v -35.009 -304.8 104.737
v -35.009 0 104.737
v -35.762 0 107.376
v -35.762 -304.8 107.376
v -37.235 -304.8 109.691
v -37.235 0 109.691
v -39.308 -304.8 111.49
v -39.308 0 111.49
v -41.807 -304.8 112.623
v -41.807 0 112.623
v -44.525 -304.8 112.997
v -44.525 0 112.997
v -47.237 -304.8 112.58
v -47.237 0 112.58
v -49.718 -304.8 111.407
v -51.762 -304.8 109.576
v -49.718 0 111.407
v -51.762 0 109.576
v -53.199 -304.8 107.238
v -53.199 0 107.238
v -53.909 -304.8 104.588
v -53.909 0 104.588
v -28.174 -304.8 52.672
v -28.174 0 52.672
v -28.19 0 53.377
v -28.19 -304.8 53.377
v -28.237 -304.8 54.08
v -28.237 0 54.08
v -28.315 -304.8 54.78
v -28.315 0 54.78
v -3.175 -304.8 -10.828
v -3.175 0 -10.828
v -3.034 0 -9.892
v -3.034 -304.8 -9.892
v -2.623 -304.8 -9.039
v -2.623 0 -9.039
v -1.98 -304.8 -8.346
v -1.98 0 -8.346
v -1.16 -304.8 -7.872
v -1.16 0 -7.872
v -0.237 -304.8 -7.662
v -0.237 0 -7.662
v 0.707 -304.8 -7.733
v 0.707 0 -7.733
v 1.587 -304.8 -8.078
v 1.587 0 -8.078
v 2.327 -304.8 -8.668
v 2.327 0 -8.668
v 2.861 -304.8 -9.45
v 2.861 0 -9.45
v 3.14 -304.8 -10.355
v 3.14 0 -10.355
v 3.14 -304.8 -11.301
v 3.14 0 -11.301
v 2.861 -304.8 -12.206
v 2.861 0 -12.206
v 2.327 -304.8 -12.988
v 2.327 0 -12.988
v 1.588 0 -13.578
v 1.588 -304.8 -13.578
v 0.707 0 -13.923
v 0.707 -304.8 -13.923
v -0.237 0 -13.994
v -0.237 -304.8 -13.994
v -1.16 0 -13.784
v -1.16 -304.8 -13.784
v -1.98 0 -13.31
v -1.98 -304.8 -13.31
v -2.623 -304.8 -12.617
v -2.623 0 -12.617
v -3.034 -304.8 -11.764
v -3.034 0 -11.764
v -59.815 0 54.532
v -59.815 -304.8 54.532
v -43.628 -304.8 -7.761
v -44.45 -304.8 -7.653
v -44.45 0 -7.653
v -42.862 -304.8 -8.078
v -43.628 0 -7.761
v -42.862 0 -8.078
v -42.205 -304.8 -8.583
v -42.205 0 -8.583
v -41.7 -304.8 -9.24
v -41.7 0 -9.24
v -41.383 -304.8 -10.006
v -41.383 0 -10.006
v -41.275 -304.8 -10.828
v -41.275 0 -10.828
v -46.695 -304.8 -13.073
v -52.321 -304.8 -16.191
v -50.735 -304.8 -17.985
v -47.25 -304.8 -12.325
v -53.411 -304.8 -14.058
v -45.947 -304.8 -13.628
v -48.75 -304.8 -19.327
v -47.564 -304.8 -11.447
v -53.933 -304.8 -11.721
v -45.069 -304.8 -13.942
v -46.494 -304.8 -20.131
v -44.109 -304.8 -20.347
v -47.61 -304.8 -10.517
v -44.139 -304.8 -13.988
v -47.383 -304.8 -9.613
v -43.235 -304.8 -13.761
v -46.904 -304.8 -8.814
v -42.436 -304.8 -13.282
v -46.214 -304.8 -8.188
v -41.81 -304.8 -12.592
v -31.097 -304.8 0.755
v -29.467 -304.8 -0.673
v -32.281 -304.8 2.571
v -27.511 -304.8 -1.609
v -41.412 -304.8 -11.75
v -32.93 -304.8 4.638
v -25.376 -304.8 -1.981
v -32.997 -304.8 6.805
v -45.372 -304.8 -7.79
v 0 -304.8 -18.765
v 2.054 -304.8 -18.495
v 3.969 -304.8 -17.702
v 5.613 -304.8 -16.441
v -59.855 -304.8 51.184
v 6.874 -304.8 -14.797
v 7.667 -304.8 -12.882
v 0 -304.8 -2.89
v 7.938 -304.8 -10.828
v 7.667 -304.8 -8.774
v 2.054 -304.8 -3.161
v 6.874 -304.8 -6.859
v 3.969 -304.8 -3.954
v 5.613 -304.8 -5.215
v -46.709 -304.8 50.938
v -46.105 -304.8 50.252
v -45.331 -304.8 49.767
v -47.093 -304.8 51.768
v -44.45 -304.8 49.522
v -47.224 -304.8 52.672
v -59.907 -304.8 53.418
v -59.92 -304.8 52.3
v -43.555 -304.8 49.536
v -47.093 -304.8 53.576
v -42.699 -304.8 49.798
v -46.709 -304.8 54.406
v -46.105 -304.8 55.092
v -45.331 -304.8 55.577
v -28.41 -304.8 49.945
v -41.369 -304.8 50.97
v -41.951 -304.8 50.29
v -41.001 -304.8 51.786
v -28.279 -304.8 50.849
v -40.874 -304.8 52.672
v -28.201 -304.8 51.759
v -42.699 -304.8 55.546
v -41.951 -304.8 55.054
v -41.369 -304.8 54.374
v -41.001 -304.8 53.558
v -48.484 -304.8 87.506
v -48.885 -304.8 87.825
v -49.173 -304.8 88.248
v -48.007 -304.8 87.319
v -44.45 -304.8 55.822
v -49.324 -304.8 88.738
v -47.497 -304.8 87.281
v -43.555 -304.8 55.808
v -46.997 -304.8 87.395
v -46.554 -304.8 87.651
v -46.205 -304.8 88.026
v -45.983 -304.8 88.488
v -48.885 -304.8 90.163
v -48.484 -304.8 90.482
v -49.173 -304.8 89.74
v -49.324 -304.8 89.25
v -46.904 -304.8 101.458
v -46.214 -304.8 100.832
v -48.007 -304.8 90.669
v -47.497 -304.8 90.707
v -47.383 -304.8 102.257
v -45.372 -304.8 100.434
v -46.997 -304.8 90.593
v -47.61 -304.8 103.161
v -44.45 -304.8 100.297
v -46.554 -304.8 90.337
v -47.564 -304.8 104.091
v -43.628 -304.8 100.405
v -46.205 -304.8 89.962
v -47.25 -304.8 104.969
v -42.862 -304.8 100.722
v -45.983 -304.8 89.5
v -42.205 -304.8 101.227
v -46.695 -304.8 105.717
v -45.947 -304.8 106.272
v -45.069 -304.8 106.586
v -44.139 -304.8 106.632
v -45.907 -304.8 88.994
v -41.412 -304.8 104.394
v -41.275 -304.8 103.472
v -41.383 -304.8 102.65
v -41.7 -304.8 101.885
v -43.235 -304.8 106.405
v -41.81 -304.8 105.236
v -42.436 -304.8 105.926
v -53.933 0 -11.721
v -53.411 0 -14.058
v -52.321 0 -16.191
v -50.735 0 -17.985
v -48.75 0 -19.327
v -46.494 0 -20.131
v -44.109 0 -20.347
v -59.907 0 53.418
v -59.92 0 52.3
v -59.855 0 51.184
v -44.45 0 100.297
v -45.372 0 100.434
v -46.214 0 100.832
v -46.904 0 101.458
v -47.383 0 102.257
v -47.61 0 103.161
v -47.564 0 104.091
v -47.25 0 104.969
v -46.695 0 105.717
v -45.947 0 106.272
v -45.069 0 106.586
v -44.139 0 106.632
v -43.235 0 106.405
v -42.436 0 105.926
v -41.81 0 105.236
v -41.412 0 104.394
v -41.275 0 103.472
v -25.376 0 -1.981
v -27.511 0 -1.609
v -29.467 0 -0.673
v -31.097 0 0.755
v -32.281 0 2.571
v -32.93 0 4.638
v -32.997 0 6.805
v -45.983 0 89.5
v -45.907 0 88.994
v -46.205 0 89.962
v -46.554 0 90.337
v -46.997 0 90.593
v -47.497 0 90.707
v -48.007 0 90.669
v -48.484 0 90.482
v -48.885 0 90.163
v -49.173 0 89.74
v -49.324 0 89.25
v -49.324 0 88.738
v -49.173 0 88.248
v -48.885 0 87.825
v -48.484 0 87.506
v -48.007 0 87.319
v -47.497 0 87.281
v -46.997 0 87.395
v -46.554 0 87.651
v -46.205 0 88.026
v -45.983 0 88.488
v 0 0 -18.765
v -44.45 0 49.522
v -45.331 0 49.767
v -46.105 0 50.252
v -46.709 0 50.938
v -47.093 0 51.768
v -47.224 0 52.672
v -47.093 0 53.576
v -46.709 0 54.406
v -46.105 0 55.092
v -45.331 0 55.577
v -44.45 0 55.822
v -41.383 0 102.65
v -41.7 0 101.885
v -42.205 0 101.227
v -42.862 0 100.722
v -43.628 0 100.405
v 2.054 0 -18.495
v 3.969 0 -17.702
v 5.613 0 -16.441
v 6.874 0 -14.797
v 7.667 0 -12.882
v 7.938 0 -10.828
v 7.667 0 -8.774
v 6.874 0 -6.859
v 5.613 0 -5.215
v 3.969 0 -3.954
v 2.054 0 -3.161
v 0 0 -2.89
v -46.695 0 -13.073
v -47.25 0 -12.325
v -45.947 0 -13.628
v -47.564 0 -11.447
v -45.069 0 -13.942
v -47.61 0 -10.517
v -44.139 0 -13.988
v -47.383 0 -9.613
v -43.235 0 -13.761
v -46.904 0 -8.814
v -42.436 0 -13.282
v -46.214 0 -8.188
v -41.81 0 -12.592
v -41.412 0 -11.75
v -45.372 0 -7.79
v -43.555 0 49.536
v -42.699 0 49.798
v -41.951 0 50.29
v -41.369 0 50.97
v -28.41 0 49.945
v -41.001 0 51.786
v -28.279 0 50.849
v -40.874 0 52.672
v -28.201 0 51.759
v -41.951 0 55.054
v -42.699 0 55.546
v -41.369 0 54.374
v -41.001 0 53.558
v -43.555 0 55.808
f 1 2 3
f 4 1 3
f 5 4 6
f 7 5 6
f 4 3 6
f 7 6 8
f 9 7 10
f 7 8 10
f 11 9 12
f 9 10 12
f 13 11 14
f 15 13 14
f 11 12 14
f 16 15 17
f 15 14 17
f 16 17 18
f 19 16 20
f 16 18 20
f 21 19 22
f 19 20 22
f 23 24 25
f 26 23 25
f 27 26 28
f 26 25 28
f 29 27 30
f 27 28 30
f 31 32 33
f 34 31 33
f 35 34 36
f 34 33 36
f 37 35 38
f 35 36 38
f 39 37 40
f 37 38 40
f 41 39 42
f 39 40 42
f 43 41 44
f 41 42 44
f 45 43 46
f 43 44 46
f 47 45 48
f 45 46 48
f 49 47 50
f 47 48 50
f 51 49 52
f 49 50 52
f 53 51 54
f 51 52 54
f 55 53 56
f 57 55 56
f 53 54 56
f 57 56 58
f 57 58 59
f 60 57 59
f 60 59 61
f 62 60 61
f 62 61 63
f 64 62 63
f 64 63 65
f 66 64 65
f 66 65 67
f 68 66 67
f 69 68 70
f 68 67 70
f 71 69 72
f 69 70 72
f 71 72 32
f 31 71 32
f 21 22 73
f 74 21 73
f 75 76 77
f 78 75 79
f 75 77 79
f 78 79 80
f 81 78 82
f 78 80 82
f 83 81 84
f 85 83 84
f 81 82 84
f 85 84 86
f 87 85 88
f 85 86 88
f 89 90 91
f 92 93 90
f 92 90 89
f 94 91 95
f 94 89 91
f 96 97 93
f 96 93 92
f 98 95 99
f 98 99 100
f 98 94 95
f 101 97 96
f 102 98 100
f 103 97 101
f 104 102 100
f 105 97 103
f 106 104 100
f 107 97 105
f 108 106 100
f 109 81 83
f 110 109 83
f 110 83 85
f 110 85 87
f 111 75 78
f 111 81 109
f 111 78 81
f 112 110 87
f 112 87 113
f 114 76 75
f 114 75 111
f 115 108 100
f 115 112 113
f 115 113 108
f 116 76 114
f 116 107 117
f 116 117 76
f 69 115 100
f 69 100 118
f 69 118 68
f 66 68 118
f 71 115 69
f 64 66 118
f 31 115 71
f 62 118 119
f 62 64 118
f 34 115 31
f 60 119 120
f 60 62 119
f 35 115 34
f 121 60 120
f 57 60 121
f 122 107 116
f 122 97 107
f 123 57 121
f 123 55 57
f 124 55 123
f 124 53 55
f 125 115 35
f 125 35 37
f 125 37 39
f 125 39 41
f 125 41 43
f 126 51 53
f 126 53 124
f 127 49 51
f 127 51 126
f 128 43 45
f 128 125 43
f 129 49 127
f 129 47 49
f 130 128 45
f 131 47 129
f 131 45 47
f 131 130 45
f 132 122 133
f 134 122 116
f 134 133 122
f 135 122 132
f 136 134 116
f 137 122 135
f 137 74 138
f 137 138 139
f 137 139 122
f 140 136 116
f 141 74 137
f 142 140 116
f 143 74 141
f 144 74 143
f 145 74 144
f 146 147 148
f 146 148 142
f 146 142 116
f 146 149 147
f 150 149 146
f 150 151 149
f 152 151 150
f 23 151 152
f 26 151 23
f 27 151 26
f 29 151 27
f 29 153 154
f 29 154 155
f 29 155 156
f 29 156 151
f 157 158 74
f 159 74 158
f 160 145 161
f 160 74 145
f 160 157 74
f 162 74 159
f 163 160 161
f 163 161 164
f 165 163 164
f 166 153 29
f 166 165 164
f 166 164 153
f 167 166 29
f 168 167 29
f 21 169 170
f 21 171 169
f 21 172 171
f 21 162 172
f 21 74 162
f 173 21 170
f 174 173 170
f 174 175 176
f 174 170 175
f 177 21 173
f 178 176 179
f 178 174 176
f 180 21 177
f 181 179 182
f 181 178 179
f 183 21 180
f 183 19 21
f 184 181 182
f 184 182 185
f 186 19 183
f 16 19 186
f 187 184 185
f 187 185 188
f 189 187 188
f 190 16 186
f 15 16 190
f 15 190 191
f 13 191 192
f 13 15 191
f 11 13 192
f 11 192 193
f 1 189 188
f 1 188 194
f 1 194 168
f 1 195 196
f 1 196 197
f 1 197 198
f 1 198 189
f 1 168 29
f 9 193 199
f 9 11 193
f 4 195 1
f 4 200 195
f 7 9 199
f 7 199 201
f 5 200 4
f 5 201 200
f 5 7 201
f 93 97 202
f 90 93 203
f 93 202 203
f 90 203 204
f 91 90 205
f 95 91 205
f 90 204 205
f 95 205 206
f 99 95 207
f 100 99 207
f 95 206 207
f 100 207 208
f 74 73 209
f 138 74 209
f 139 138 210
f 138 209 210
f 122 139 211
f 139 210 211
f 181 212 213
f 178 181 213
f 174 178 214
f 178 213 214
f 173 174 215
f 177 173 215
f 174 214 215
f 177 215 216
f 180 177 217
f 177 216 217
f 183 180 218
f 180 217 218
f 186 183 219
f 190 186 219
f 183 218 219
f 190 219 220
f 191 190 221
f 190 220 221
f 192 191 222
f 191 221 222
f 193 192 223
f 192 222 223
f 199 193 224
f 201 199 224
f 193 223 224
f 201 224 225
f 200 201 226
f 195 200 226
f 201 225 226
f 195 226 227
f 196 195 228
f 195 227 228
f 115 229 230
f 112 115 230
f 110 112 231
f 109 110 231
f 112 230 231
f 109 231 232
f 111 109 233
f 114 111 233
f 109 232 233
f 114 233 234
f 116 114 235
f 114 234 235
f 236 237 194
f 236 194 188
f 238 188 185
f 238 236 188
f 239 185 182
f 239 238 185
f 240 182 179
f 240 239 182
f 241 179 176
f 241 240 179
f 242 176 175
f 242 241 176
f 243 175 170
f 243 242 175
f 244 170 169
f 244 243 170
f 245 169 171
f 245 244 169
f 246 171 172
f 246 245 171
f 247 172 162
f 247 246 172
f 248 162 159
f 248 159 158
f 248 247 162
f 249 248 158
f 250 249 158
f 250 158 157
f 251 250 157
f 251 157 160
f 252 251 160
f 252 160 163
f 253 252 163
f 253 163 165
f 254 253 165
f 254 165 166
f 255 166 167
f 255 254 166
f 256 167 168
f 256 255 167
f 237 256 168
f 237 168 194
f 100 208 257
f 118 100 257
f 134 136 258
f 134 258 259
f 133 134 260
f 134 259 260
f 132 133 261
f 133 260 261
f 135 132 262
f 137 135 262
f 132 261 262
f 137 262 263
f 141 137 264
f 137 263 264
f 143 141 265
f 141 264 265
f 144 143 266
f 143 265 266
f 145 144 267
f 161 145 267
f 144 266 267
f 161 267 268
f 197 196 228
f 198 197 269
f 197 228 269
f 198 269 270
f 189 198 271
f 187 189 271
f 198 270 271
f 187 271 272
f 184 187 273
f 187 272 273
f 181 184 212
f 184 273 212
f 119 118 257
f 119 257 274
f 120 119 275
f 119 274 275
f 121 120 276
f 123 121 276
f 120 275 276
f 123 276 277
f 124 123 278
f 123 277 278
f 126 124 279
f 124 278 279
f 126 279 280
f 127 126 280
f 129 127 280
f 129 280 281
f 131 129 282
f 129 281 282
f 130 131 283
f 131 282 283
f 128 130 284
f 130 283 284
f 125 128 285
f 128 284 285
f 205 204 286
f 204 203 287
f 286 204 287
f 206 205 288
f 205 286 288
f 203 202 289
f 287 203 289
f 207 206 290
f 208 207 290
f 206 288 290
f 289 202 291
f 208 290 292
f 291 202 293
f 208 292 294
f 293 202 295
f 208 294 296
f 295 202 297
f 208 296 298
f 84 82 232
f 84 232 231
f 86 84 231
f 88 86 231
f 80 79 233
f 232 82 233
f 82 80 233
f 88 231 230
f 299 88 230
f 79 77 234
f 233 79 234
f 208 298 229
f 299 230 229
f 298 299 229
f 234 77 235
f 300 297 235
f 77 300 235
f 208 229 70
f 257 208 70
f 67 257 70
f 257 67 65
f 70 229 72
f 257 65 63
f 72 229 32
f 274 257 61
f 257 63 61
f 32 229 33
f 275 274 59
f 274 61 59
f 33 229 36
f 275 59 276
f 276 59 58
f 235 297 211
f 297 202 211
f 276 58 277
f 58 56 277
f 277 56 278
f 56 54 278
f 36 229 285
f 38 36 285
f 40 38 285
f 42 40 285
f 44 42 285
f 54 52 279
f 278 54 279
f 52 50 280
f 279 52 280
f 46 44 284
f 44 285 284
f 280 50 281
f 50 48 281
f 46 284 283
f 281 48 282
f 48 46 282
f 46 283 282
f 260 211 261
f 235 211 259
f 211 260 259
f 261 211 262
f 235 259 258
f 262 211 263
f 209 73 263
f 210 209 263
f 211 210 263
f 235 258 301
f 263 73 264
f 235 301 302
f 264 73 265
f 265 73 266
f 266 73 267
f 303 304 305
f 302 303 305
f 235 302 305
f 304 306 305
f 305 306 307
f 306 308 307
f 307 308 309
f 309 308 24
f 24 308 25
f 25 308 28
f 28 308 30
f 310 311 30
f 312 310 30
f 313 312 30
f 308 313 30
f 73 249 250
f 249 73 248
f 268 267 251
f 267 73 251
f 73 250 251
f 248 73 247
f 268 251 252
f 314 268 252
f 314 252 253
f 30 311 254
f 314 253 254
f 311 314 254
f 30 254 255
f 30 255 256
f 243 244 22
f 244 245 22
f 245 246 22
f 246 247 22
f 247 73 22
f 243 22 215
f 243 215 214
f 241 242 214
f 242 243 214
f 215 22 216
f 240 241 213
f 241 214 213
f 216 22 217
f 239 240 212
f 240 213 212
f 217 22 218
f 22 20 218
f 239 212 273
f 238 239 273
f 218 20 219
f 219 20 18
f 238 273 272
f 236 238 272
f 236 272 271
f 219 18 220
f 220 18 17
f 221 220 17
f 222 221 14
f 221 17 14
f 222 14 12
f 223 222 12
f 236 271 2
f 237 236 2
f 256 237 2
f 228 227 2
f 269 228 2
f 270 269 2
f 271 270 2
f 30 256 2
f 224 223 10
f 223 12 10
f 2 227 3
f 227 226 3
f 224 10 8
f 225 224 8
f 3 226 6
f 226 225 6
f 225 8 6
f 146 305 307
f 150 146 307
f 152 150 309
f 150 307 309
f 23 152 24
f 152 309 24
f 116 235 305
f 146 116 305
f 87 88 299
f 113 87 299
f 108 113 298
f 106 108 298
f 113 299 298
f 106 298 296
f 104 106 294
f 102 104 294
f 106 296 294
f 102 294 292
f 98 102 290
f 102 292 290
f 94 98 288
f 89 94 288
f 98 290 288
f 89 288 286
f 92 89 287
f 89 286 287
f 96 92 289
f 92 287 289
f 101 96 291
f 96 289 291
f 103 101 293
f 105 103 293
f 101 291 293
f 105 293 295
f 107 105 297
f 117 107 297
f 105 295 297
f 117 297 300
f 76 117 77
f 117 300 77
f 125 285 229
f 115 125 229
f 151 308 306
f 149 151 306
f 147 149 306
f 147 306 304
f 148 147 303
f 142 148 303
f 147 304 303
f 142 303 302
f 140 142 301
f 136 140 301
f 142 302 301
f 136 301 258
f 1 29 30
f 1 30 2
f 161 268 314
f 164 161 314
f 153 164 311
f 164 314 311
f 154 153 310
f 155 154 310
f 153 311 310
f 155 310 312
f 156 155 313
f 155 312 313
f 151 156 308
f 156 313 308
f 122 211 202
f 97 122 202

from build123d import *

# Parameters (mm, degrees)
F0_R     = 1.7182468223
F1_DEPTH = 304.8


with BuildPart() as f1:
    # F0 (on Front) → F1 (new body)
    with BuildSketch(Plane.XZ):
        with BuildLine():
            Line((-32.9967385804, 6.8048425582), (-28.4104094703, 49.945047138))
            ThreePointArc((-28.4104094703, 49.945047138), (-33.9877661328, 40.392821433), (-44.45, 36.8020574797))
            Line((-44.45, 36.8020574797), (-44.45, -1.302996767))
            ThreePointArc((-44.45, -1.302996767), (-37.7148079092, -4.0928046762), (-34.925, -10.827996767))
            Line((-34.925, -10.827996767), (-7.9375, -10.827996767))
            ThreePointArc((-7.9375, -10.827996767), (-5.6126600757, -5.2153366913), (0, -2.890496767))
            Line((0, -2.890496767), (-25.3759362201, -1.9807197434))
            ThreePointArc((-25.3759362201, -1.9807197434), (-31.0967184952, 0.7549521344), (-32.9967385804, 6.8048425582))
        make_face()
        with BuildLine():
            ThreePointArc((-44.45, 36.8020574797), (-54.883074079, 41.0682090736), (-59.8545699484, 51.1842020046))
            Line((-59.8545699484, 51.1842020046), (-53.9330768267, -11.720677504))
            ThreePointArc((-53.9330768267, -11.720677504), (-51.4937351249, -4.4161779541), (-44.45, -1.302996767))
            Line((-44.45, -1.302996767), (-44.45, 36.8020574797))
        make_face()
        with BuildLine():
            ThreePointArc((-44.45, -1.302996767), (-51.4937351249, -4.4161779541), (-53.9330768267, -11.720677504))
            ThreePointArc((-53.9330768267, -11.720677504), (-50.7345844929, -17.9854839484), (-44.1087293489, -20.3468811209))
            ThreePointArc((-44.1087293489, -20.3468811209), (-37.5952123318, -17.4414308994), (-34.925, -10.827996767))
            Line((-34.925, -10.827996767), (-41.275, -10.827996767))
            ThreePointArc((-41.275, -10.827996767), (-46.6950640303, -13.0730607973), (-44.45, -7.652996767))
            Line((-44.45, -7.652996767), (-44.45, -1.302996767))
        make_face()
        with BuildLine():
            ThreePointArc((-34.925, -10.827996767), (-37.7148079092, -4.0928046762), (-44.45, -1.302996767))
            Line((-44.45, -1.302996767), (-44.45, -7.652996767))
            ThreePointArc((-44.45, -7.652996767), (-42.2049359697, -8.5829327367), (-41.275, -10.827996767))
            Line((-41.275, -10.827996767), (-34.925, -10.827996767))
        make_face()
        with BuildLine():
            ThreePointArc((-34.925, -10.827996767), (-37.5952123318, -17.4414308994), (-44.1087293489, -20.3468811209))
            Line((-44.1087293489, -20.3468811209), (0, -18.765496767))
            ThreePointArc((0, -18.765496767), (-5.6126600757, -16.4406568427), (-7.9375, -10.827996767))
            Line((-7.9375, -10.827996767), (-34.925, -10.827996767))
        make_face()
        with BuildLine():
            ThreePointArc((-7.9375, -10.827996767), (-5.6126600757, -16.4406568427), (0, -18.765496767))
            ThreePointArc((0, -18.765496767), (5.6126600757, -16.4406568427), (7.9375, -10.827996767))
            ThreePointArc((7.9375, -10.827996767), (5.6126600757, -5.2153366913), (0, -2.890496767))
            ThreePointArc((0, -2.890496767), (-5.6126600757, -5.2153366913), (-7.9375, -10.827996767))
        make_face()
        with BuildLine():
            ThreePointArc((3.175, -10.827996767), (0, -14.002996767), (-3.175, -10.827996767))
            ThreePointArc((-3.175, -10.827996767), (0, -7.652996767), (3.175, -10.827996767))
        make_face(mode=Mode.SUBTRACT)
        with BuildLine():
            ThreePointArc((-28.1744419038, 52.672003233), (-28.2096407737, 53.7285661304), (-28.3150812936, 54.7804436962))
            ThreePointArc((-28.3150812936, 54.7804436962), (-33.74768808, 64.7504755351), (-44.45, 68.5419489863))
            Line((-44.45, 68.5419489863), (-44.45, 55.8216346736))
            ThreePointArc((-44.45, 55.8216346736), (-41.9507693419, 55.0544806154), (-40.8744419038, 52.672003233))
            ThreePointArc((-40.8744419038, 52.672003233), (-41.9507693419, 50.2895258506), (-44.45, 49.5223717924))
            Line((-44.45, 49.5223717924), (-44.45, 36.8020574797))
            ThreePointArc((-44.45, 36.8020574797), (-33.9877661328, 40.392821433), (-28.4104094703, 49.945047138))
            ThreePointArc((-28.4104094703, 49.945047138), (-28.2335438123, 51.3034300493), (-28.1744419038, 52.672003233))
        make_face()
        with BuildLine():
            Line((-44.45, 55.8216346736), (-44.45, 68.5419489863))
            ThreePointArc((-44.45, 68.5419489863), (-54.7455063411, 64.4027248883), (-59.8150941698, 54.532066035))
            ThreePointArc((-59.8150941698, 54.532066035), (-59.9233384244, 52.8591776278), (-59.8545699484, 51.1842020046))
            ThreePointArc((-59.8545699484, 51.1842020046), (-54.883074079, 41.0682090736), (-44.45, 36.8020574797))
            Line((-44.45, 36.8020574797), (-44.45, 49.5223717924))
            ThreePointArc((-44.45, 49.5223717924), (-47.2244419038, 52.672003233), (-44.45, 55.8216346736))
        make_face()
        with BuildLine():
            Line((-44.45, 68.5419489863), (-44.45, 93.947003233))
            ThreePointArc((-44.45, 93.947003233), (-51.5688441447, 97.1436793599), (-53.9093913596, 104.5880409142))
            Line((-53.9093913596, 104.5880409142), (-59.8150941698, 54.532066035))
            ThreePointArc((-59.8150941698, 54.532066035), (-54.7455063411, 64.4027248883), (-44.45, 68.5419489863))
        make_face()
        with Locations((-47.625, 88.994003233)):
            Circle(F0_R, mode=Mode.SUBTRACT)
        with BuildLine():
            ThreePointArc((-35.0093836339, 104.7370675109), (-34.9461193219, 104.1059409715), (-34.925, 103.472003233))
            ThreePointArc((-34.925, 103.472003233), (-37.7148079092, 96.7368111422), (-44.45, 93.947003233))
            Line((-44.45, 93.947003233), (-44.45, 68.5419489863))
            ThreePointArc((-44.45, 68.5419489863), (-33.74768808, 64.7504755351), (-28.3150812936, 54.7804436962))
            Line((-28.3150812936, 54.7804436962), (-35.0093836339, 104.7370675109))
        make_face()
        with BuildLine():
            ThreePointArc((-44.45, 93.947003233), (-37.7148079092, 96.7368111422), (-34.925, 103.472003233))
            ThreePointArc((-34.925, 103.472003233), (-34.9461193219, 104.1059409715), (-35.0093836339, 104.7370675109))
            ThreePointArc((-35.0093836339, 104.7370675109), (-44.5251023084, 112.9967071467), (-53.9093913596, 104.5880409142))
            ThreePointArc((-53.9093913596, 104.5880409142), (-51.5688441447, 97.1436793599), (-44.45, 93.947003233))
        make_face()
        with BuildLine():
            ThreePointArc((-41.275, 103.472003233), (-42.2049359697, 101.2269392027), (-44.45, 100.297003233))
            ThreePointArc((-44.45, 100.297003233), (-46.6950640303, 105.7170672633), (-41.275, 103.472003233))
        make_face(mode=Mode.SUBTRACT)
    extrude(amount=F1_DEPTH)


solid = f1.part
